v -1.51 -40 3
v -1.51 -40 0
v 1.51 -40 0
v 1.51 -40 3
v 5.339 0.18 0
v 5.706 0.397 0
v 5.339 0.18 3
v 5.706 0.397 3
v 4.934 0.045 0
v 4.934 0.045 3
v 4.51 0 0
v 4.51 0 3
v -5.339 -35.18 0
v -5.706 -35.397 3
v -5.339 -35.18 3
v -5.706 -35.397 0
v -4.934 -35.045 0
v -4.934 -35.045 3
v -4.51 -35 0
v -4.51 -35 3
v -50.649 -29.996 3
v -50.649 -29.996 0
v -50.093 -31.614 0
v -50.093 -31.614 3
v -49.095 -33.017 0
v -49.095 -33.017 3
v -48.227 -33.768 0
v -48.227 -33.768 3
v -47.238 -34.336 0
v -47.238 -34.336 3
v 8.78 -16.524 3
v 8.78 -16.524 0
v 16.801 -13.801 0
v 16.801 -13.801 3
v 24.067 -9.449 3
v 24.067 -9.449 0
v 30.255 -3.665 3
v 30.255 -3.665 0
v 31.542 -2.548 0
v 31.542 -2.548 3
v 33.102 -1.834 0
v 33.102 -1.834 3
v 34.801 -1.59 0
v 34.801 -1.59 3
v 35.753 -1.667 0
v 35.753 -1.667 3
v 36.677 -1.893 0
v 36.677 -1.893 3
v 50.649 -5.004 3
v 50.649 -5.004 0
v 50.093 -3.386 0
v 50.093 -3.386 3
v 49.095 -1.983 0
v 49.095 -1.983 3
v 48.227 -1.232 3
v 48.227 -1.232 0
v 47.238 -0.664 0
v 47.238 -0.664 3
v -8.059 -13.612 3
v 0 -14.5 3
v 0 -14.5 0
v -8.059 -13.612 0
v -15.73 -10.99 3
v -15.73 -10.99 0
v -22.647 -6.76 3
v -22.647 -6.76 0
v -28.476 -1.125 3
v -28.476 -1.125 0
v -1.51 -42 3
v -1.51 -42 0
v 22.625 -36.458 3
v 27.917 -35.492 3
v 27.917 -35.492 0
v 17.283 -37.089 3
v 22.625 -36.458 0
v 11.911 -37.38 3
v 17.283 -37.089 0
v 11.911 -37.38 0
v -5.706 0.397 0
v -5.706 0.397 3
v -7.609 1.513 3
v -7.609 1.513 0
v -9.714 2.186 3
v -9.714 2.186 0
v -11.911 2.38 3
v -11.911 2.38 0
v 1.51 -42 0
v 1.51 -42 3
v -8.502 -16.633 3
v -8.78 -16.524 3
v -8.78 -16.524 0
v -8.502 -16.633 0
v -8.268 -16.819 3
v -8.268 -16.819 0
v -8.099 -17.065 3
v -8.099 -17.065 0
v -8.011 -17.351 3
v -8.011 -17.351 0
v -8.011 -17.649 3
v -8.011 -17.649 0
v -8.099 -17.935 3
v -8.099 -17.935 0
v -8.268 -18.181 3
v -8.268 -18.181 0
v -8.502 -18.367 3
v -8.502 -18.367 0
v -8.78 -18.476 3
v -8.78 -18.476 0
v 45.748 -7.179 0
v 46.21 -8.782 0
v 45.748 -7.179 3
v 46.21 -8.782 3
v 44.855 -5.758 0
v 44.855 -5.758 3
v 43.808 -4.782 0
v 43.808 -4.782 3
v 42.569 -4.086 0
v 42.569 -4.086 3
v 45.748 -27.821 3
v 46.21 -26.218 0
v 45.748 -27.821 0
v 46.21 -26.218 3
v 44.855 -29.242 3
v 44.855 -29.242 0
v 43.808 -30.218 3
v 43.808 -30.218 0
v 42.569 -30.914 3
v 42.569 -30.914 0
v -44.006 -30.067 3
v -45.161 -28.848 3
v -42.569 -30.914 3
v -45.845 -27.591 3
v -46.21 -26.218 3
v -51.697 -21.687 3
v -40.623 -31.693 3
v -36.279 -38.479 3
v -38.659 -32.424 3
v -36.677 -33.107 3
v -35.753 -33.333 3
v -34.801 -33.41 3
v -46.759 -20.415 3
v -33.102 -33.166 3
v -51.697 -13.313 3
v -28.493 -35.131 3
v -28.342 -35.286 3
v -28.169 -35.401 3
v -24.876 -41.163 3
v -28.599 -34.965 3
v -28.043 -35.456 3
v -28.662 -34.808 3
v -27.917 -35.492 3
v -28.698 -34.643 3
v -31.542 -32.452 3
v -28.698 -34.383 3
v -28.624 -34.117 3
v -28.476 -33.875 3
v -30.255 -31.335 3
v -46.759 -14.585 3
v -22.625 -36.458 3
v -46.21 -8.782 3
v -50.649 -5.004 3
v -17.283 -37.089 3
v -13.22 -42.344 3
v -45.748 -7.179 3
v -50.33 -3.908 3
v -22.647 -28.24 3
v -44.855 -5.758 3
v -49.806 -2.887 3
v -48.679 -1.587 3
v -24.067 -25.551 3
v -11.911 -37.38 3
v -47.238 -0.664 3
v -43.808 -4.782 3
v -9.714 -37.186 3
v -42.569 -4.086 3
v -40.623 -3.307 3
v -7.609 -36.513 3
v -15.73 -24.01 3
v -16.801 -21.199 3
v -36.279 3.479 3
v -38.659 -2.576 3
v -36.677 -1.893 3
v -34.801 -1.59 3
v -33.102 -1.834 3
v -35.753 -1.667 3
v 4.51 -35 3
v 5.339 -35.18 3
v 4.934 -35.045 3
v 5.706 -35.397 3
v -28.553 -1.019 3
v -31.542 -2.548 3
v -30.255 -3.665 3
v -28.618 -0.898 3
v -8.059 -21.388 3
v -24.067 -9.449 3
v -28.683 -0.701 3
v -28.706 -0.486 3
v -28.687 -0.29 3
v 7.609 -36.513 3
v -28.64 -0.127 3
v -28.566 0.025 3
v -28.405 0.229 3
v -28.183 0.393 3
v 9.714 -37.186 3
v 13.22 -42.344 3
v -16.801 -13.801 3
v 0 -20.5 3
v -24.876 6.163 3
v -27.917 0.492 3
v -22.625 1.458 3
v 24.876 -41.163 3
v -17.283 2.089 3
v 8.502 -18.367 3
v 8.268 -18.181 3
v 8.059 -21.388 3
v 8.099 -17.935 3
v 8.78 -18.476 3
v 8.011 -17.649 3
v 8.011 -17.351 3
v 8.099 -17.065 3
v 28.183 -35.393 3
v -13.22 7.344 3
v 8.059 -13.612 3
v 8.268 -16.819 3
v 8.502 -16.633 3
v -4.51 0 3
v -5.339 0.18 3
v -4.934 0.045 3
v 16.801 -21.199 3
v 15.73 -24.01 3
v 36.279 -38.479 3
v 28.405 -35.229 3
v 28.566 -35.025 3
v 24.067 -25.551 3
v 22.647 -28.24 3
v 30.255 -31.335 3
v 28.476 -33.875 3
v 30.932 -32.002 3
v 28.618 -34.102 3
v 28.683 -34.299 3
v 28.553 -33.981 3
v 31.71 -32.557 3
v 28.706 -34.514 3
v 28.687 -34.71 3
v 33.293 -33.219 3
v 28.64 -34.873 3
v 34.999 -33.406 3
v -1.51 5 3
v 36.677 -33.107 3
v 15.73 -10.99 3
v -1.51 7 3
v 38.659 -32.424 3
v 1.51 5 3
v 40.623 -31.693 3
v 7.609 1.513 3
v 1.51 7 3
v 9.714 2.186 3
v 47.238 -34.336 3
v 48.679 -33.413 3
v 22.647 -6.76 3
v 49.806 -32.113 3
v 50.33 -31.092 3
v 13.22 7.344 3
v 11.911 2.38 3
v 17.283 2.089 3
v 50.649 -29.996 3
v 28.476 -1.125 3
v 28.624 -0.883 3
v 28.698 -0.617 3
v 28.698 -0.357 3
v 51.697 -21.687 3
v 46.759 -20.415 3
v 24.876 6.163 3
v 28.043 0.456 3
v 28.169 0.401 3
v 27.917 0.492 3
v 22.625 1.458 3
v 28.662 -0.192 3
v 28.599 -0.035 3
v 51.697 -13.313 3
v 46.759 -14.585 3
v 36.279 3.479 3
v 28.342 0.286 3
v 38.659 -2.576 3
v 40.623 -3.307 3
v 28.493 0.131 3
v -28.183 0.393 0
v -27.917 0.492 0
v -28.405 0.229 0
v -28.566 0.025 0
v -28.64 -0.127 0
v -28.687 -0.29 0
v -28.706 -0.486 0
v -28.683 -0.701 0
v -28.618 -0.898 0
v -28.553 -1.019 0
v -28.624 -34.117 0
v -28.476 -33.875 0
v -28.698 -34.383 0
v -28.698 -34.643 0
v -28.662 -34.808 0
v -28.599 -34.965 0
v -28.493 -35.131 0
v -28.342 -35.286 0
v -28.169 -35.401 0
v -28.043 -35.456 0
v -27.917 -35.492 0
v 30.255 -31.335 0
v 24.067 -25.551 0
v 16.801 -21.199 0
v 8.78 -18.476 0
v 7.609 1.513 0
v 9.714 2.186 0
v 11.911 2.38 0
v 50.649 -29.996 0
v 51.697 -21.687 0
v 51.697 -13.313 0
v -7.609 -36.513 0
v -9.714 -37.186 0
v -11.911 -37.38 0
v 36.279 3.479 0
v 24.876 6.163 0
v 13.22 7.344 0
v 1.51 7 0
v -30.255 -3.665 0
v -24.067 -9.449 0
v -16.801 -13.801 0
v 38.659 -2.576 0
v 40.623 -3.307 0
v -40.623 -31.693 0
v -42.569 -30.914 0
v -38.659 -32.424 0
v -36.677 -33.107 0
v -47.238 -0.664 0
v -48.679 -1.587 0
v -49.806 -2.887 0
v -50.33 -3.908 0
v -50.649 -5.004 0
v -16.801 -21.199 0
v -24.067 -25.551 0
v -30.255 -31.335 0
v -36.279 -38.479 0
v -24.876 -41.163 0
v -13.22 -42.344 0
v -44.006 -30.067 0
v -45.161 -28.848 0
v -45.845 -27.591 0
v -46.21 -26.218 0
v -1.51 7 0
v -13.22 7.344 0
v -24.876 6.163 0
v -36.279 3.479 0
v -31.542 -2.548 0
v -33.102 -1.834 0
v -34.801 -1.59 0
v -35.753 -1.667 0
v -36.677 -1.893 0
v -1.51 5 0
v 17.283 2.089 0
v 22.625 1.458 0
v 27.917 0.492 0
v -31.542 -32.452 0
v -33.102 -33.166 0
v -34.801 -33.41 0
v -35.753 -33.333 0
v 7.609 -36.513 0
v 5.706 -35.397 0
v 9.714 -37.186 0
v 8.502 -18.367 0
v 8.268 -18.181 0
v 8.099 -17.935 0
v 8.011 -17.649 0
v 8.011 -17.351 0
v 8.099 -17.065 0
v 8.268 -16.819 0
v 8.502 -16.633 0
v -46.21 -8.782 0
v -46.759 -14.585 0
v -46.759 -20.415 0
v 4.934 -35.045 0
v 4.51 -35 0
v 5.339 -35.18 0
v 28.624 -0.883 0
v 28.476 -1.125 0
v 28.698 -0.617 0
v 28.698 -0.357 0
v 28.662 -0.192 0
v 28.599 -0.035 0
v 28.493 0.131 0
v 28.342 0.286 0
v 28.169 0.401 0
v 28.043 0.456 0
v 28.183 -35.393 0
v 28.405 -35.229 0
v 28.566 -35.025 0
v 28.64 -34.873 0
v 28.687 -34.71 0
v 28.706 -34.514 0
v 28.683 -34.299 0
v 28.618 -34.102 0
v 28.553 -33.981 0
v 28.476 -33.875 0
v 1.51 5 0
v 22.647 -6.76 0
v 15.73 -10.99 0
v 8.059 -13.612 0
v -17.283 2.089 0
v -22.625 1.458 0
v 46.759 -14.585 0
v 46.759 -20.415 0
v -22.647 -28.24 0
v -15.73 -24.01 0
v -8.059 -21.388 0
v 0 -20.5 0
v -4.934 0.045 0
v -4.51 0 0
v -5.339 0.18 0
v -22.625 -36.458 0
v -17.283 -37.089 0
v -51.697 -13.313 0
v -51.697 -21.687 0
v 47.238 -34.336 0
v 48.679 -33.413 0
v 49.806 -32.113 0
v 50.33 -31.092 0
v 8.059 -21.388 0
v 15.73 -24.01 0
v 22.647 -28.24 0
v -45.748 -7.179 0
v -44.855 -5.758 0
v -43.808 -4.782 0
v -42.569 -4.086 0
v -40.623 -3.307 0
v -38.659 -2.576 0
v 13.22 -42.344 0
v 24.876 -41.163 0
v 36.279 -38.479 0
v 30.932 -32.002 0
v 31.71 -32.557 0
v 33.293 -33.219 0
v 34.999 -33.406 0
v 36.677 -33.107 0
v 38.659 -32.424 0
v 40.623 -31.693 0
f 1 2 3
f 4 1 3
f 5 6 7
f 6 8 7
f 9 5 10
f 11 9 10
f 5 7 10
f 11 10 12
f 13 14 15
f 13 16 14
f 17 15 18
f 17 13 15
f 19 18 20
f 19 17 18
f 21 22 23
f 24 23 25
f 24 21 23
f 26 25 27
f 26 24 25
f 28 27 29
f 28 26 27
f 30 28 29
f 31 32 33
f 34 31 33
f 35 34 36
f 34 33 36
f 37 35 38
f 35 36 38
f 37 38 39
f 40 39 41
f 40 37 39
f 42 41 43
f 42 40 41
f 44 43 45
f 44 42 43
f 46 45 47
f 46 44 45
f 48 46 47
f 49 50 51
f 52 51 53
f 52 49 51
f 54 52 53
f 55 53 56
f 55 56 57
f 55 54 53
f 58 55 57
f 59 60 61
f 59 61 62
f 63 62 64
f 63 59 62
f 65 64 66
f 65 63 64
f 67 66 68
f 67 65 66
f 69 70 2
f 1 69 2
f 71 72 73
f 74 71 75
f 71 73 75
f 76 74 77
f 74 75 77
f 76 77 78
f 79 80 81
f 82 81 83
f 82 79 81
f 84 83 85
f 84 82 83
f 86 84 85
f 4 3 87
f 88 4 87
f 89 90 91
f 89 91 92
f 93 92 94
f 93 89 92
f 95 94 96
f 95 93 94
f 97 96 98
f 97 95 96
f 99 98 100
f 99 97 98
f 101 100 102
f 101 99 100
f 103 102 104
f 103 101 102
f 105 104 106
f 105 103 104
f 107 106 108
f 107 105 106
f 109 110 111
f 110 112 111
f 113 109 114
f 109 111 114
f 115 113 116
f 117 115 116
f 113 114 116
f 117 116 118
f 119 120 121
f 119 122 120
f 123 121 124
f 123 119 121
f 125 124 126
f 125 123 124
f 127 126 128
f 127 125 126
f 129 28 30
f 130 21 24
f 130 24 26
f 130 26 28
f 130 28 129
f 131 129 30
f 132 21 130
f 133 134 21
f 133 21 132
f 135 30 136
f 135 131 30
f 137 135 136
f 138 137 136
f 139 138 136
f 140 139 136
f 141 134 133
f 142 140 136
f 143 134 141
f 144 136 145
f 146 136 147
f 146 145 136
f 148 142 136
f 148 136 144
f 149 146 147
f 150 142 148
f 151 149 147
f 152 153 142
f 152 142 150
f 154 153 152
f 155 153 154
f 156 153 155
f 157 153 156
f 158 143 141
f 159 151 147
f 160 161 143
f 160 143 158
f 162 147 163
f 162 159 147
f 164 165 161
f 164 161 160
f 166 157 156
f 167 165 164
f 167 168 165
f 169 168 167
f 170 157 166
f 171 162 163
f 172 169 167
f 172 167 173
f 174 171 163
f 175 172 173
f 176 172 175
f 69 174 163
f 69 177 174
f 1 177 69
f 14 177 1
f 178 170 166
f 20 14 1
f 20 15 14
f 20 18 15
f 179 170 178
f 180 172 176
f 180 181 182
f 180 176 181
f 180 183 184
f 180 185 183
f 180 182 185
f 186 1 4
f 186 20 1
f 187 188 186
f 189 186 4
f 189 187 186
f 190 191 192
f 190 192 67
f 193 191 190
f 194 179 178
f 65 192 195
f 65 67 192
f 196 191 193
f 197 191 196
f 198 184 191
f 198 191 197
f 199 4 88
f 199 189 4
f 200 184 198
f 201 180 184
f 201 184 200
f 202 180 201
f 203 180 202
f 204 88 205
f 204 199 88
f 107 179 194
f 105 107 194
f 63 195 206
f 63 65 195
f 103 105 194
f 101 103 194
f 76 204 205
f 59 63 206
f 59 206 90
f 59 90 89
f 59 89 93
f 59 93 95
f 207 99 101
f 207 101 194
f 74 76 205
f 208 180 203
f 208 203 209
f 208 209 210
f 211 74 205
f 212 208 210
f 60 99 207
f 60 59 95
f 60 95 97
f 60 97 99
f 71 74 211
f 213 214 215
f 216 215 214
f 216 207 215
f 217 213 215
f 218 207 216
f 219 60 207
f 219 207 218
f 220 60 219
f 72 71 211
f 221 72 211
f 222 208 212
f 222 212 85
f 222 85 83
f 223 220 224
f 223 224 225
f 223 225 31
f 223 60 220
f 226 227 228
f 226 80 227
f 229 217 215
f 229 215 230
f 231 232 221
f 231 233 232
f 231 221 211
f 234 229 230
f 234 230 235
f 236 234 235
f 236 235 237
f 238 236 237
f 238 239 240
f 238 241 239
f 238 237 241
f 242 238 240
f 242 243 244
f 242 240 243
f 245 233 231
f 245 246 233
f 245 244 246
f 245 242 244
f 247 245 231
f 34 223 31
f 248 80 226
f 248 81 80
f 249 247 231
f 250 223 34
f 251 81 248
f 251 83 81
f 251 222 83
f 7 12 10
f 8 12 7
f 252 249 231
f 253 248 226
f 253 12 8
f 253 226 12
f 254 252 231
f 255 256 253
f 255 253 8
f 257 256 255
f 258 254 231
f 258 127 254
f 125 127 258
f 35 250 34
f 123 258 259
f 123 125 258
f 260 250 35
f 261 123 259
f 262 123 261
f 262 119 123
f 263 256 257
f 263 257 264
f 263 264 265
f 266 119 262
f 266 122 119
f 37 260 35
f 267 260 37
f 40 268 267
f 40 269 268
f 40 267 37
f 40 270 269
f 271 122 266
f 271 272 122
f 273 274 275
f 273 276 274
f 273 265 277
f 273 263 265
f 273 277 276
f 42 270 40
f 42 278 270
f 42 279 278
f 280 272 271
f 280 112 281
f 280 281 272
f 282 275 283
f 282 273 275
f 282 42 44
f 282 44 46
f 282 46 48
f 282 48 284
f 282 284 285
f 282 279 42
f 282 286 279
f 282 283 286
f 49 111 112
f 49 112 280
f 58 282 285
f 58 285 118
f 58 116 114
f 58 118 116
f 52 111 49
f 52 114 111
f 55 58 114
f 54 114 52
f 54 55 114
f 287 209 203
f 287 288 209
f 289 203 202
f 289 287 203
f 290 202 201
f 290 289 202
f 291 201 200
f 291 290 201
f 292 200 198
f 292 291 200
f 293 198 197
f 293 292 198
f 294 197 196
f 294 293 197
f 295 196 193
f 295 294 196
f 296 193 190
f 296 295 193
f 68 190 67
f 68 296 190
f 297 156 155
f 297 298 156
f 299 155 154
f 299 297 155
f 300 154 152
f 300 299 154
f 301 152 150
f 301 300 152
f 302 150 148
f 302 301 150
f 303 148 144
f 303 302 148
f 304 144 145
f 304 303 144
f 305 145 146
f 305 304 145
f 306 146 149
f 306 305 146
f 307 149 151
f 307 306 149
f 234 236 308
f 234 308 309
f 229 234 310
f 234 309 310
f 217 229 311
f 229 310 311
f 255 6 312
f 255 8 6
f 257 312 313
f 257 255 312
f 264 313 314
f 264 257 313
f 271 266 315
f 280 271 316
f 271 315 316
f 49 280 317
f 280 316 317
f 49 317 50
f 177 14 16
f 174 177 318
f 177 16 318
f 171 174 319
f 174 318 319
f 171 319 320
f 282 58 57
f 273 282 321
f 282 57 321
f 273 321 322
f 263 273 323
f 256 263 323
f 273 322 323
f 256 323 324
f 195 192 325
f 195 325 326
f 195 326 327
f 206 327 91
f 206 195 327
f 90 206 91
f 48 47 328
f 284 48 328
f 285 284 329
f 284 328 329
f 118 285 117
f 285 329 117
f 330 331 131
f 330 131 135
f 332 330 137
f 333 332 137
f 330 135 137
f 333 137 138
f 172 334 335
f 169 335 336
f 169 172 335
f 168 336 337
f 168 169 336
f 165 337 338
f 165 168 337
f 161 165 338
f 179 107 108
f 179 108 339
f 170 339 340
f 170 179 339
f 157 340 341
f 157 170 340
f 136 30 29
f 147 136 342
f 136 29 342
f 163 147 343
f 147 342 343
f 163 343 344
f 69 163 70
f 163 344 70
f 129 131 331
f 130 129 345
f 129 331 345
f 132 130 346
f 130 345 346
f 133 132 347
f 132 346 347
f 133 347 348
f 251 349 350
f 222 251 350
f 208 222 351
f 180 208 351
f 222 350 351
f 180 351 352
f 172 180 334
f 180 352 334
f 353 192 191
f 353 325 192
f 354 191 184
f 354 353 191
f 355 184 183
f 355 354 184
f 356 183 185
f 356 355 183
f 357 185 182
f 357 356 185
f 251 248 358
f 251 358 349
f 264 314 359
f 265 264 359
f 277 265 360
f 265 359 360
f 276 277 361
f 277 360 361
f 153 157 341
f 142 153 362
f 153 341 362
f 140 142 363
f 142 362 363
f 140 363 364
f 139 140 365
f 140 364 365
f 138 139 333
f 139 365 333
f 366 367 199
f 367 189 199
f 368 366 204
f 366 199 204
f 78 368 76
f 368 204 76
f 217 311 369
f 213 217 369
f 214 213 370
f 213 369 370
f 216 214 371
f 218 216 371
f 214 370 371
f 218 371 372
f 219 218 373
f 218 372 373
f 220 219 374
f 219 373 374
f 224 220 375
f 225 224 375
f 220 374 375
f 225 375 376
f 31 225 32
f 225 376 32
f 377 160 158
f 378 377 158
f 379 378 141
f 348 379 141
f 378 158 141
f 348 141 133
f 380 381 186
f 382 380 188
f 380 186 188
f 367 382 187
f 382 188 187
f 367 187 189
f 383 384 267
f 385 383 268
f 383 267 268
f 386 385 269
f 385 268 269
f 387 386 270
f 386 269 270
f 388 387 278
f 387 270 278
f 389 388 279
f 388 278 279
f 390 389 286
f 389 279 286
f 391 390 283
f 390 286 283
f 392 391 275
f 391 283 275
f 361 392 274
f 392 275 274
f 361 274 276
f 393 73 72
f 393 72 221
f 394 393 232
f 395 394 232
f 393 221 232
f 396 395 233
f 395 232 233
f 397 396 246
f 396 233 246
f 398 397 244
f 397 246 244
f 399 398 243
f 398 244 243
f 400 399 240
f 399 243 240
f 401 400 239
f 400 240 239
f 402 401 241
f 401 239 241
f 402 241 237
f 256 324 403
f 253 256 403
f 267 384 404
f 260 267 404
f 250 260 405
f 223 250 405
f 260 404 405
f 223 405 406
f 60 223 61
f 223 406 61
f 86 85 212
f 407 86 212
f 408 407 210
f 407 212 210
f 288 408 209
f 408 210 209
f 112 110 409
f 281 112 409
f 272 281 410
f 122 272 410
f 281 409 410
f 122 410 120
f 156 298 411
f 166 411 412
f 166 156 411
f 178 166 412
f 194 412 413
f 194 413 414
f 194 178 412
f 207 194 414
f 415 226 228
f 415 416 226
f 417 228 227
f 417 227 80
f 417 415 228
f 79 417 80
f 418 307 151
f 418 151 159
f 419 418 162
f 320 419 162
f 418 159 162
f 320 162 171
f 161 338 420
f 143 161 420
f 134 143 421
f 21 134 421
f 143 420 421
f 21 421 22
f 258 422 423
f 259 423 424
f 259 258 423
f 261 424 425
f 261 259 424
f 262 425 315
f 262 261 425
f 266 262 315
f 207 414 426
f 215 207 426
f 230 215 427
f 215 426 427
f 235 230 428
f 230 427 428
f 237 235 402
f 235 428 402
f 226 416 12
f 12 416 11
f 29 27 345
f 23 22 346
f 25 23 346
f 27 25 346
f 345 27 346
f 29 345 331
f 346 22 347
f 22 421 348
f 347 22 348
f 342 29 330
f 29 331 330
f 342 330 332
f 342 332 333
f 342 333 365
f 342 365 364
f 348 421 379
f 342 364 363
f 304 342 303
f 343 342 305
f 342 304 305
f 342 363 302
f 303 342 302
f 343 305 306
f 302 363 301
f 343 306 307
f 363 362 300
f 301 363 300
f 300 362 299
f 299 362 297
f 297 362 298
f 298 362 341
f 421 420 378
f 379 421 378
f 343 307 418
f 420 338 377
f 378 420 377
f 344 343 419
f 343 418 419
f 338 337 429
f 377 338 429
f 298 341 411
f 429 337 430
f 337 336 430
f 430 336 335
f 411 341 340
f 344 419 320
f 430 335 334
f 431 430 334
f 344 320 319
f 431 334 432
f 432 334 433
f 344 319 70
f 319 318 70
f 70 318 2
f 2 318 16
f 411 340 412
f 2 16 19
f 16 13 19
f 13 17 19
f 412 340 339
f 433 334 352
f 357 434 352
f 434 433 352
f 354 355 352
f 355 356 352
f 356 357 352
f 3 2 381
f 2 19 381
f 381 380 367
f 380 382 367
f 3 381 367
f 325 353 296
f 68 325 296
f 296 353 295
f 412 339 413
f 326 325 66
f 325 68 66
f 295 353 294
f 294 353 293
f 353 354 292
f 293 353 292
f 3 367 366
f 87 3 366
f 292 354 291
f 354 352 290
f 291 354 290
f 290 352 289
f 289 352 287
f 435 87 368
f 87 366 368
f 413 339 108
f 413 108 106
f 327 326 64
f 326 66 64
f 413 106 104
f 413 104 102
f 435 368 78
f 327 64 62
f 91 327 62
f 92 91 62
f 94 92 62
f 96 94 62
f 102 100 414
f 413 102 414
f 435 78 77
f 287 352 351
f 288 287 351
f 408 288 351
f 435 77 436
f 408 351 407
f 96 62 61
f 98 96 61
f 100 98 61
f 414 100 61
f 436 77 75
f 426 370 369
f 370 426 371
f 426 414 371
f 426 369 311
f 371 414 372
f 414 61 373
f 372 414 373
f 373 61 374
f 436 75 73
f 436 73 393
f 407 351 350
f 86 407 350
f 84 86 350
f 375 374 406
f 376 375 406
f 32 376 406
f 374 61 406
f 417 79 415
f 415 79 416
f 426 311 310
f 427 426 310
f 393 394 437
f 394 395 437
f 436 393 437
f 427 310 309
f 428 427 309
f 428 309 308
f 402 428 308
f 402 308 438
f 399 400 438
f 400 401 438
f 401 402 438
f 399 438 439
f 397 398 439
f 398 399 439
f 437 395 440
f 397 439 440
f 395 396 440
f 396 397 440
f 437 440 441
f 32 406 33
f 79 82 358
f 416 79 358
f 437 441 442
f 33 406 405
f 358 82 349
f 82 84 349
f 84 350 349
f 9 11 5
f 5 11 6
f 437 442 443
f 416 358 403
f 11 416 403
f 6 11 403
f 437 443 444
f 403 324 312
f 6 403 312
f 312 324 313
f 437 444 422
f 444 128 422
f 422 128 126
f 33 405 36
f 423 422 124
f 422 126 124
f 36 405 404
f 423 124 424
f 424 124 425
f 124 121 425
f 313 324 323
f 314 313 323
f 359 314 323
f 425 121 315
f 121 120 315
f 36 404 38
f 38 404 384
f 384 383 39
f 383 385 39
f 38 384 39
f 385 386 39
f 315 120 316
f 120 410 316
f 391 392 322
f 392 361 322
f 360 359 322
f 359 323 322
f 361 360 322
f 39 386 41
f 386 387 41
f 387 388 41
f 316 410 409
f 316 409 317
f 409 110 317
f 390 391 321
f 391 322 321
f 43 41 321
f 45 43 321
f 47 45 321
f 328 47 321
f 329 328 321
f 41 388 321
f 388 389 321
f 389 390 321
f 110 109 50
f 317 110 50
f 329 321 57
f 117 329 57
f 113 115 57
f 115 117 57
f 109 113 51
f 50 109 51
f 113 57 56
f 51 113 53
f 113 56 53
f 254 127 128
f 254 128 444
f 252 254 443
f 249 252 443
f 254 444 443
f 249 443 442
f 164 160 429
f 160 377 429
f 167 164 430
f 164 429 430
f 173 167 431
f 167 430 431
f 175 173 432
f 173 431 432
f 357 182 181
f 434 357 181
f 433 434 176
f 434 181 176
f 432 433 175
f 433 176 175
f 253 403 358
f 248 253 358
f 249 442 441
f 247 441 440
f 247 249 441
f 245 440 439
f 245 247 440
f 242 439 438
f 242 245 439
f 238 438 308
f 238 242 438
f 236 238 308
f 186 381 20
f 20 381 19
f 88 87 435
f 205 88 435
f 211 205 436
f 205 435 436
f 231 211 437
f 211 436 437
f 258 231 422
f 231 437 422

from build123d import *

# Parameters (mm, degrees)
BOSS_EXTRUDE1_DEPTH = 3
CUT_EXTRUDE1_REACH  = 69.03
SKETCH2_W           = 5
SKETCH2_H           = 35
BOSS_EXTRUDE8_DEPTH = 3
MIRROR1_DEPTH       = 3
FILLET1_R           = 2
FILLET2_R           = 10
FILLET3_R           = 6
FILLET4_R           = 1


# Read off the part's stored shape, not the designer's step: Mirror1
with BuildPart() as part:
    # Sketch1 → Boss-Extrude1 (new body)
    with BuildSketch(Plane.XY):
        with BuildLine():
            Line((-1.51, 0), (0, 0))
            Line((0, 0), (0, 5))
            Line((0, 5), (-1.51, 5))
            Line((-1.51, 5), (-1.51, 7))
            ThreePointArc((-1.51, 7), (-26.381774629, 5.897879108), (-50, -1.976082663))
            ThreePointArc((-50, -1.976082663), (-51.828078002, -17.5), (-50, -33.023917337))
            ThreePointArc((-50, -33.023917337), (-26.381774629, -40.897879108), (-1.51, -42))
            Line((-1.51, -42), (-1.51, -40))
            Line((-1.51, -40), (0, -40))
            Line((0, -40), (0, -35))
            Line((0, -35), (-1.51, -35))
            Line((-1.51, -35), (-1.51, -33))
            Line((-1.51, -33), (-1.51, -2))
            Line((-1.51, -2), (-1.51, 0))
        make_face()
    extrude(amount=BOSS_EXTRUDE1_DEPTH)

    # Sketch2 → Cut-Extrude1 (cut, up to next)
    with BuildSketch(Plane.XY.offset(3), mode=Mode.PRIVATE) as cut_extrude1_sk1:
        with BuildLine():
            ThreePointArc((-45.638636542, -5.430742036), (-46.828078002, -17.5), (-45.638636542, -29.569257964))
            ThreePointArc((-45.638636542, -29.569257964), (-26.536011476, -35.777357536), (-6.51, -37.329661985))
            Line((-6.51, -37.329661985), (-6.51, 2.329661985))
            ThreePointArc((-6.51, 2.329661985), (-26.536011476, 0.777357536), (-45.638636542, -5.430742036))
        make_face()
    cut_extrude1_tool1 = extrude(cut_extrude1_sk1.sketch, amount=-CUT_EXTRUDE1_REACH, mode=Mode.PRIVATE) & part.part
    # Sketch2 → Cut-Extrude1 (cut, up to next)
    with BuildSketch(Plane.XY.offset(3), mode=Mode.PRIVATE) as cut_extrude1_sk2:
        with Locations((-4.01, -17.5)):
            Rectangle(SKETCH2_W, SKETCH2_H)
    cut_extrude1_tool2 = extrude(cut_extrude1_sk2.sketch, amount=-CUT_EXTRUDE1_REACH, mode=Mode.PRIVATE) & part.part
    add(cut_extrude1_tool1.solids().sort_by_distance((-24.946194, -17.5, 3))[0], mode=Mode.SUBTRACT)
    add(cut_extrude1_tool2.solids().sort_by_distance((-4.01, -17.5, 3))[0], mode=Mode.SUBTRACT)

    # Sketch3 → Boss-Extrude8 (add)
    with BuildSketch(Plane.XY.offset(3)):
        with BuildLine():
            ThreePointArc((-32.612027687, -34.338487741), (-31.049231117, -34.753813219), (-29.478816537, -35.139334187))
            ThreePointArc((-29.478816537, -35.139334187), (-16.456843028, -24.361316901), (0, -20.5))
            Line((0, -20.5), (0, -14.5))
            ThreePointArc((0, -14.5), (-16.456843028, -10.638683099), (-29.478816537, 0.139334187))
            ThreePointArc((-29.478816537, 0.139334187), (-31.049231117, -0.246186781), (-32.612027687, -0.661512259))
            ThreePointArc((-32.612027687, -0.661512259), (-22.163998061, -10.798005795), (-8.780487851, -16.524390234))
            ThreePointArc((-8.780487851, -16.524390234), (-8, -17.499999784), (-8.780487429, -18.475609671))
            ThreePointArc((-8.780487429, -18.475609671), (-22.163997881, -24.201994085), (-32.612027687, -34.338487741))
        make_face()
    extrude(amount=-BOSS_EXTRUDE8_DEPTH)

    # Mirror1 outline → Mirror1 (add)
    with BuildSketch(Plane.XY):
        with BuildLine():
            ThreePointArc((29.478816537, -35.139334187), (18.069073524, -37.017473377), (6.51, -37.329661985))
            Line((6.51, -37.329661985), (6.51, -35))
            Line((6.51, -35), (0, -35))
            Line((0, -35), (0, -40))
            Line((0, -40), (1.51, -40))
            Line((1.51, -40), (1.51, -42))
            ThreePointArc((1.51, -42), (26.381774629, -40.897879108), (50, -33.023917337))
            ThreePointArc((50, -33.023917337), (51.828078002, -17.5), (50, -1.976082663))
            ThreePointArc((50, -1.976082663), (26.381774629, 5.897879108), (1.51, 7))
            Line((1.51, 7), (1.51, 5))
            Line((1.51, 5), (0, 5))
            Line((0, 5), (0, 0))
            Line((0, 0), (6.51, 0))
            Line((6.51, 0), (6.51, 2.329661985))
            ThreePointArc((6.51, 2.329661985), (18.069073524, 2.017473377), (29.478816537, 0.139334187))
            ThreePointArc((29.478816537, 0.139334187), (16.456843029, -10.638683099), (0, -14.5))
            Line((0, -14.5), (0, -20.5))
            ThreePointArc((0, -20.5), (16.456843029, -24.361316901), (29.478816537, -35.139334187))
        make_face()
        with BuildLine():
            ThreePointArc((45.638636542, -29.569257964), (39.22278835, -32.220063478), (32.612027687, -34.338487741))
            ThreePointArc((32.612027687, -34.338487741), (22.163998041, -24.201994192), (8.780487805, -18.475609756))
            ThreePointArc((8.780487805, -18.475609756), (8, -17.5), (8.780487805, -16.524390244))
            ThreePointArc((8.780487805, -16.524390244), (22.163998041, -10.798005808), (32.612027687, -0.661512259))
            ThreePointArc((32.612027687, -0.661512259), (39.22278835, -2.779936522), (45.638636542, -5.430742036))
            ThreePointArc((45.638636542, -5.430742036), (46.828078002, -17.5), (45.638636542, -29.569257964))
        make_face(mode=Mode.SUBTRACT)
    extrude(amount=MIRROR1_DEPTH)

    # Fillet1
    fillet1_edges = [part.edges().sort_by_distance(p)[0] for p in [
        (6.51, -35, 1.5),
        (6.51, 0, 1.5),
        (-6.51, 0, 1.5),
        (-6.51, -35, 1.5),
    ]]
    fillet(fillet1_edges, radius=FILLET1_R)

    # Fillet2
    fillet2_edges = [part.edges().sort_by_distance(p)[0] for p in [
        (-6.51, 2.329661985, 1.5),
        (6.51, 2.329661985, 1.5),
        (6.51, -37.329661985, 1.5),
        (-6.51, -37.329661985, 1.5),
    ]]
    fillet(fillet2_edges, radius=FILLET2_R)

    # Fillet3
    fillet3_edges = [part.edges().sort_by_distance(p)[0] for p in [
        (45.638636542, -5.430742036, 1.5),
        (45.638636542, -29.569257964, 1.5),
        (32.612027687, -0.661512259, 1.5),
        (32.612027687, -34.338487741, 1.5),
        (-50, -33.023917337, 1.5),
        (-50, -1.976082663, 1.5),
        (-45.638636542, -29.569257964, 1.5),
        (-45.638636542, -5.430742036, 1.5),
        (-32.612027687, -0.661512259, 1.5),
        (-32.612027687, -34.338487741, 1.5),
        (50, -1.976082663, 1.5),
        (50, -33.023917337, 1.5),
    ]]
    fillet(fillet3_edges, radius=FILLET3_R)

    # Fillet4
    fillet4_edges = [part.edges().sort_by_distance(p)[0] for p in [
        (29.478816537, 0.139334187, 1.5),
        (29.478816537, -35.139334187, 1.5),
        (-29.478816537, -35.139334187, 1.5),
        (-29.478816537, 0.139334187, 1.5),
    ]]
    fillet(fillet4_edges, radius=FILLET4_R)


solid = part.part
